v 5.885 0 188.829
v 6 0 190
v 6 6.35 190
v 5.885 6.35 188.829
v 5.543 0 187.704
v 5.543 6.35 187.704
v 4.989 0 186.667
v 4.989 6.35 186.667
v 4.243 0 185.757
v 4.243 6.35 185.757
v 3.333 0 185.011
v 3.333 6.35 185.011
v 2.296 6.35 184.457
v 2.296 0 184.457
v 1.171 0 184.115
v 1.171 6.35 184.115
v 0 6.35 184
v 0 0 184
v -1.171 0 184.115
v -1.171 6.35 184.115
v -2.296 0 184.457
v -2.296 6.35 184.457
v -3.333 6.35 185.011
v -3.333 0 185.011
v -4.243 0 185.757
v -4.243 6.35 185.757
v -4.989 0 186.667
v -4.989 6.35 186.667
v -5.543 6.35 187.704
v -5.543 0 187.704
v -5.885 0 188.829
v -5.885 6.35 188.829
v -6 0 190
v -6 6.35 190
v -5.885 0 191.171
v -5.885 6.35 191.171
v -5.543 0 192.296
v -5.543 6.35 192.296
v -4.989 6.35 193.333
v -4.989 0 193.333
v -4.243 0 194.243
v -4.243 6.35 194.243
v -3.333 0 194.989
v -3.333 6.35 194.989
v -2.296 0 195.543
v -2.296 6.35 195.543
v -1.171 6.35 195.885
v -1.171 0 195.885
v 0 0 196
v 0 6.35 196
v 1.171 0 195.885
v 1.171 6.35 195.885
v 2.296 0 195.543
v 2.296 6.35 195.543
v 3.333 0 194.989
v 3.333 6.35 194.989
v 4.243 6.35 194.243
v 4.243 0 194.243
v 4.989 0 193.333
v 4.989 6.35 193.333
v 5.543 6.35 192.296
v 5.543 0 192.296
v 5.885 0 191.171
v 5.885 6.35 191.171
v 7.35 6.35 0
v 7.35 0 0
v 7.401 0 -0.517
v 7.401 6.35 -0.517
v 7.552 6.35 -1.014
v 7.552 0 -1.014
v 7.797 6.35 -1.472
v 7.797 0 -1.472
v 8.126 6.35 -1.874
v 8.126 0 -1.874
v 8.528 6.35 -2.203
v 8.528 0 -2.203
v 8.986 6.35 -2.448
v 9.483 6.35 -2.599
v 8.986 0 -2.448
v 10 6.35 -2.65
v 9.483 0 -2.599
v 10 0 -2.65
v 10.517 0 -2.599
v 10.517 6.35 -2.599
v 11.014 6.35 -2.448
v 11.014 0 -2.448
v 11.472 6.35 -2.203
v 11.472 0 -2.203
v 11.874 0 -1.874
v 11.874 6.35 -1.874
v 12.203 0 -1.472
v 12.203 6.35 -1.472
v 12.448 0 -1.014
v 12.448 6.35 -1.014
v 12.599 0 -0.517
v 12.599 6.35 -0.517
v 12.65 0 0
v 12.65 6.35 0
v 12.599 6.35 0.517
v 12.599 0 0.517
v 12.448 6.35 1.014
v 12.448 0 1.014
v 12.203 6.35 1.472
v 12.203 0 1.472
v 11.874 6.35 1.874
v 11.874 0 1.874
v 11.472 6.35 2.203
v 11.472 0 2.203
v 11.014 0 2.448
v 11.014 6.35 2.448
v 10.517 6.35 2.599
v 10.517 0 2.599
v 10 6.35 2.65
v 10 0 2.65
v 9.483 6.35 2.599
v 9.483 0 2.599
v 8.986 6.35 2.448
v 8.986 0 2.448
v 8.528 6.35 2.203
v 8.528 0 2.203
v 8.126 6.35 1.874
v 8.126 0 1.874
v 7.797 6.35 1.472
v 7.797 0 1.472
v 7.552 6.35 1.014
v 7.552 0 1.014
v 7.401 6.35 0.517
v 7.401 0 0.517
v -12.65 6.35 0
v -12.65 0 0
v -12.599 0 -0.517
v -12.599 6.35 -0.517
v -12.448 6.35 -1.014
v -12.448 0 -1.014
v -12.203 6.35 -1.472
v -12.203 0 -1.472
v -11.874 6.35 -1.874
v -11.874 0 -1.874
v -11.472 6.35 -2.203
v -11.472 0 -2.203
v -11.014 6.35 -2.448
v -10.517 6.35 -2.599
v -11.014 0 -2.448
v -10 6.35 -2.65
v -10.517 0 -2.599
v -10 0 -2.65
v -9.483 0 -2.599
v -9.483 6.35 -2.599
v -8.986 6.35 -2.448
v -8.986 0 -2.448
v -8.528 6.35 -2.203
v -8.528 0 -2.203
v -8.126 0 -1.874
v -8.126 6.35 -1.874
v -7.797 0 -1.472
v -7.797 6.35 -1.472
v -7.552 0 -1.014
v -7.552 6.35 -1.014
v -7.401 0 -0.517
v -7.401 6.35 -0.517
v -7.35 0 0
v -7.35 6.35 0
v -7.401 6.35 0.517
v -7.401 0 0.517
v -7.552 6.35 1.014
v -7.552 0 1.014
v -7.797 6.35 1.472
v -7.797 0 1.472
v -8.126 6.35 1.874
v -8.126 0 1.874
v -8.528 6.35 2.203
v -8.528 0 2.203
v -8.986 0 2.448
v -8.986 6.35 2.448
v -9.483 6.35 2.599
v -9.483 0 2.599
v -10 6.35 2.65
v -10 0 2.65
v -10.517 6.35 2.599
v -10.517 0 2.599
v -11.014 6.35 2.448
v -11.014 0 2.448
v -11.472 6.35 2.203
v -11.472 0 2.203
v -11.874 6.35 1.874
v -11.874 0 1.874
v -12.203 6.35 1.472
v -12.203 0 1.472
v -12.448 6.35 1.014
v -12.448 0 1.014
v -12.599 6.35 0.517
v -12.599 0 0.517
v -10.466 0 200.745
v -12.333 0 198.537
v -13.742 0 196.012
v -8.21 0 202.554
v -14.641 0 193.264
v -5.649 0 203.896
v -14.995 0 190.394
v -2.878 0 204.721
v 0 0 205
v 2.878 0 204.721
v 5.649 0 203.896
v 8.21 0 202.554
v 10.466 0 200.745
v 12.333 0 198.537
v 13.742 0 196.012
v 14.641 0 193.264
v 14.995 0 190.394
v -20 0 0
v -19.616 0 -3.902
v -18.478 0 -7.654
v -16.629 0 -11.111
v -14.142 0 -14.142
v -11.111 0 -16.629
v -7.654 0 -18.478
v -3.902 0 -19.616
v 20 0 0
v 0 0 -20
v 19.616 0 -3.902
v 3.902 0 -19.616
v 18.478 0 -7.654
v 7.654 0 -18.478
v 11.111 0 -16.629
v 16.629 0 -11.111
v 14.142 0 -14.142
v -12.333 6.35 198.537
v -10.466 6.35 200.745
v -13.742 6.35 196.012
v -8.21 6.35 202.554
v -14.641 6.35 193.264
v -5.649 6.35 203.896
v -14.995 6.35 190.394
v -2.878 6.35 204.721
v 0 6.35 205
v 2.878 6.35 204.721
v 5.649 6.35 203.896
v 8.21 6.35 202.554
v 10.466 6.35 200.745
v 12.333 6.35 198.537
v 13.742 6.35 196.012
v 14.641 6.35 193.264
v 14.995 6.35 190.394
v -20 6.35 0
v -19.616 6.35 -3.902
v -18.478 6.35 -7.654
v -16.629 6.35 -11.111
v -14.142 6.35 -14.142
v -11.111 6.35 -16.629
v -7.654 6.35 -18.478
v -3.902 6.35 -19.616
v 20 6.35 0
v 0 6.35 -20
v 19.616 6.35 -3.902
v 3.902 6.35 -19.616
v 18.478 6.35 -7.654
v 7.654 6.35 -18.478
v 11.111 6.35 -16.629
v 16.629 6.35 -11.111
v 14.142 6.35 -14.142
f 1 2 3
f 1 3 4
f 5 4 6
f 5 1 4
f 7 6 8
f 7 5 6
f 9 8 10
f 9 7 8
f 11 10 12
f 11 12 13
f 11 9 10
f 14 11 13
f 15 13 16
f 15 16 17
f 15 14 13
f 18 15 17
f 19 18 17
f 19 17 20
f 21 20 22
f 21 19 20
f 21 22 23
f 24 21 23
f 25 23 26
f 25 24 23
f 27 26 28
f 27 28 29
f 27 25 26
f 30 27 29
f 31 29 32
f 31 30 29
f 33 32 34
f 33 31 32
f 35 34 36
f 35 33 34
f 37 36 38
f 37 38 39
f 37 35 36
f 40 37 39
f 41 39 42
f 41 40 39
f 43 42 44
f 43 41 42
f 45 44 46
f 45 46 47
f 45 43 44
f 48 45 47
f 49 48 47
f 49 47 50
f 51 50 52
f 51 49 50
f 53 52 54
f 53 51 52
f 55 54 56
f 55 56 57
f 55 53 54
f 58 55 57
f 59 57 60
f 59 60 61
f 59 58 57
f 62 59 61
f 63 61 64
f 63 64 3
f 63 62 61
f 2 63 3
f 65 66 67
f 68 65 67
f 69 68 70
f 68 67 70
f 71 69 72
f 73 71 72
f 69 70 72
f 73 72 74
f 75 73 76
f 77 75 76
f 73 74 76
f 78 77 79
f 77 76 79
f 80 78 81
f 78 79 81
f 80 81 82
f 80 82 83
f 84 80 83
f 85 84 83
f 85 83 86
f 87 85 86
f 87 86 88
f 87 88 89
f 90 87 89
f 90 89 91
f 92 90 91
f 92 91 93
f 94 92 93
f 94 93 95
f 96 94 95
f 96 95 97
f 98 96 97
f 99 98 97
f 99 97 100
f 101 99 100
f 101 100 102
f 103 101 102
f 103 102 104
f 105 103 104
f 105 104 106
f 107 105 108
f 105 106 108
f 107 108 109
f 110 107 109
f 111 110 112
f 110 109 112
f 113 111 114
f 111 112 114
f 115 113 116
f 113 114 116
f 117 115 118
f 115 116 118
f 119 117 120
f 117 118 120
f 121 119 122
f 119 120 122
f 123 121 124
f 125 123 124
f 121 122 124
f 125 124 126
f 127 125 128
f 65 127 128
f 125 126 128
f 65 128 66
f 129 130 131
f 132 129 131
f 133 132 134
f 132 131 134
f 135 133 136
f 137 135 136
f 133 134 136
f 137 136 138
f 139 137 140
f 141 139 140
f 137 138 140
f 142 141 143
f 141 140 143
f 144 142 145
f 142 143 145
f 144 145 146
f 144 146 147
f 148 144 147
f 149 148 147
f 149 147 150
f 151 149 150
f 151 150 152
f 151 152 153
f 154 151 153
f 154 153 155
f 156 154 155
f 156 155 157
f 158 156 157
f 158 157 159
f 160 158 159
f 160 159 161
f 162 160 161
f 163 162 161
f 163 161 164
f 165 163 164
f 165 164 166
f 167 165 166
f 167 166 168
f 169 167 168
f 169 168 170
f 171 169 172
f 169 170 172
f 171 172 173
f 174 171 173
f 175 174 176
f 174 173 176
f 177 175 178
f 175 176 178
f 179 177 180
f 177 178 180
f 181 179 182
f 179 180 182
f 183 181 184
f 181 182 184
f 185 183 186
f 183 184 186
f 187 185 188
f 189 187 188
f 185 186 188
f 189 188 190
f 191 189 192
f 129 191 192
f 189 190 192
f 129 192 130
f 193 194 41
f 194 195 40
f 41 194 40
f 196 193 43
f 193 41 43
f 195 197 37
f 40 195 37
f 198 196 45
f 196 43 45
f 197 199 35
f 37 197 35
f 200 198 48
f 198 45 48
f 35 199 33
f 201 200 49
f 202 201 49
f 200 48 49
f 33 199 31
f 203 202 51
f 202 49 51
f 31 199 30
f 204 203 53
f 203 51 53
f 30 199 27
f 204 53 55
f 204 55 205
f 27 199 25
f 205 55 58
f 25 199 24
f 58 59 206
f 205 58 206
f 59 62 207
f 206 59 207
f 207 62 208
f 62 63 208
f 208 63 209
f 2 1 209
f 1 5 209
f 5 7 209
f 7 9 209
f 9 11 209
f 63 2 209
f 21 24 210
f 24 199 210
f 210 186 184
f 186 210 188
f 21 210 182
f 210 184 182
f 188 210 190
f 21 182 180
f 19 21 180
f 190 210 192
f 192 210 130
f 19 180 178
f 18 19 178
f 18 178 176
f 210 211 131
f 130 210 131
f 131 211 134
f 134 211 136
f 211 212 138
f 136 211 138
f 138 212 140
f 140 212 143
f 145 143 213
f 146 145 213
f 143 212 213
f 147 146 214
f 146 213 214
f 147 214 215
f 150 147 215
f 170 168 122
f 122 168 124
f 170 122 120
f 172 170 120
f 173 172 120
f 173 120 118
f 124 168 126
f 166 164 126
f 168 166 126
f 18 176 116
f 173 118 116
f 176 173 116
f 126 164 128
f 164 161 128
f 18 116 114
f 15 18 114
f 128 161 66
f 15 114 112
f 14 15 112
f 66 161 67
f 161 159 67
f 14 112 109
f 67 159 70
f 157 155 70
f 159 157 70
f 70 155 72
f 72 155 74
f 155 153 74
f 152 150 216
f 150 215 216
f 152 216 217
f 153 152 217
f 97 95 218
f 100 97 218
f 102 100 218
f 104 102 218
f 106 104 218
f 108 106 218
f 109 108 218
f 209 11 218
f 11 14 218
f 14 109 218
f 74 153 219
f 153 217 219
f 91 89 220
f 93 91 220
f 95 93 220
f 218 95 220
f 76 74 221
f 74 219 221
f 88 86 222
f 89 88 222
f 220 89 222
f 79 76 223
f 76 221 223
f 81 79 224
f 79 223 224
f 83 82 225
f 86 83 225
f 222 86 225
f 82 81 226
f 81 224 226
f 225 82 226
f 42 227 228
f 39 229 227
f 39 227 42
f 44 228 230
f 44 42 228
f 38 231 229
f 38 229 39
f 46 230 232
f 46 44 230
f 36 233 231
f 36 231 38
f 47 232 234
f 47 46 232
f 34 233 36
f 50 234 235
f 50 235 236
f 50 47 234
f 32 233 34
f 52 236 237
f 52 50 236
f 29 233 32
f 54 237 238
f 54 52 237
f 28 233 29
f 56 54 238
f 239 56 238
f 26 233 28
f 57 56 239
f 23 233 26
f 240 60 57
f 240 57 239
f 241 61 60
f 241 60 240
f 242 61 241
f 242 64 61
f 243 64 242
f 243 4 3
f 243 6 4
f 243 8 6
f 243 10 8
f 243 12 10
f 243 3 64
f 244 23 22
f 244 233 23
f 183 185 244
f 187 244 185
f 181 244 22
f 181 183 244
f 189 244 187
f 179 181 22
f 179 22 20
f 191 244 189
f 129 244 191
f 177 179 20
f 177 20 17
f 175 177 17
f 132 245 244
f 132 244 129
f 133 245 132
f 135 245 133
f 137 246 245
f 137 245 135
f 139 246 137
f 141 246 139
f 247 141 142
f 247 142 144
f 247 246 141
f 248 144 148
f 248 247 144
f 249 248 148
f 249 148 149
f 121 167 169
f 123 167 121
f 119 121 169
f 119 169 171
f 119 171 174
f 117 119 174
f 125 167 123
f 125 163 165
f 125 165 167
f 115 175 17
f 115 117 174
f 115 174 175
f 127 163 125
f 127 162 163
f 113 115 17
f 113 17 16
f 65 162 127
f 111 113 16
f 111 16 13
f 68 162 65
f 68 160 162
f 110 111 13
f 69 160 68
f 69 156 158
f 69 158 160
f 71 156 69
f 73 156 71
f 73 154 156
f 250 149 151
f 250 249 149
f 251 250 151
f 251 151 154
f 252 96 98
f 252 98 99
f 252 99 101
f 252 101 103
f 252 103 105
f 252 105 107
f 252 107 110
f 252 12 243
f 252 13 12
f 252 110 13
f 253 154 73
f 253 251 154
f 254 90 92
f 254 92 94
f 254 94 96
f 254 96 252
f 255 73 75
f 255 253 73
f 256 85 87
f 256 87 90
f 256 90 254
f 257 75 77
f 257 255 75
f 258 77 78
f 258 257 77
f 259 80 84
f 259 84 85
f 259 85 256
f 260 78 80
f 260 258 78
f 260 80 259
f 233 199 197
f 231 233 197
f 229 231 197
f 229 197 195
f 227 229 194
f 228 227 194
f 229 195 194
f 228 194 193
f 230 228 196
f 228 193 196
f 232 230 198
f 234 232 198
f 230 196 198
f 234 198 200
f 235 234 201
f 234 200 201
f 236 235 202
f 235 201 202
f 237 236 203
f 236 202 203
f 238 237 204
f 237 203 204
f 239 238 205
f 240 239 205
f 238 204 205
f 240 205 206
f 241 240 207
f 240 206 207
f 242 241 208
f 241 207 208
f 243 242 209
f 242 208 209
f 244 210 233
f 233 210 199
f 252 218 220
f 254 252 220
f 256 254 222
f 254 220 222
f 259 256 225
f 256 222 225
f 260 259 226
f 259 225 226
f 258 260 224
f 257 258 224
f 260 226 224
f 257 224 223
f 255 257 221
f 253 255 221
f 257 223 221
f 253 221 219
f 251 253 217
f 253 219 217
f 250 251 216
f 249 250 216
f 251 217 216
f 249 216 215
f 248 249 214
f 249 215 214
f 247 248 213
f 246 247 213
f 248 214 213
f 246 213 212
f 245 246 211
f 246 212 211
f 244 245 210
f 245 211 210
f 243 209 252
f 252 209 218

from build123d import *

# Parameters (mm, degrees)
SKETCH1_R            = 6
BOSS_EXTRUDE1_DEPTH  = 6.35
M5_CLEARANCE_HOLE1_D = 5.3


with BuildPart() as part:
    # Sketch1 → Boss-Extrude1 (new body)
    with BuildSketch(Plane(origin=(0, 0, 0), x_dir=(1, 0, 0), z_dir=(0, 1, 0))):
        with BuildLine():
            Line((-20, 0), (-14.99481954, -190.394191531))
            ThreePointArc((-14.99481954, -190.394191531), (0, -205), (14.99481954, -190.394191531))
            Line((14.99481954, -190.394191531), (20, 0))
            ThreePointArc((20, 0), (0, 20), (-20, 0))
        make_face()
        with Locations((0, -190)):
            Circle(SKETCH1_R, mode=Mode.SUBTRACT)
    extrude(amount=BOSS_EXTRUDE1_DEPTH)

    # M5 Clearance Hole1 (through all)
    with Locations(Plane(origin=(0, 6.35, 0), x_dir=(1, 0, 0), z_dir=(0, 1, 0))):
        with Locations((-10, 0), (10, 0)):
            Hole(M5_CLEARANCE_HOLE1_D / 2)


solid = part.part
